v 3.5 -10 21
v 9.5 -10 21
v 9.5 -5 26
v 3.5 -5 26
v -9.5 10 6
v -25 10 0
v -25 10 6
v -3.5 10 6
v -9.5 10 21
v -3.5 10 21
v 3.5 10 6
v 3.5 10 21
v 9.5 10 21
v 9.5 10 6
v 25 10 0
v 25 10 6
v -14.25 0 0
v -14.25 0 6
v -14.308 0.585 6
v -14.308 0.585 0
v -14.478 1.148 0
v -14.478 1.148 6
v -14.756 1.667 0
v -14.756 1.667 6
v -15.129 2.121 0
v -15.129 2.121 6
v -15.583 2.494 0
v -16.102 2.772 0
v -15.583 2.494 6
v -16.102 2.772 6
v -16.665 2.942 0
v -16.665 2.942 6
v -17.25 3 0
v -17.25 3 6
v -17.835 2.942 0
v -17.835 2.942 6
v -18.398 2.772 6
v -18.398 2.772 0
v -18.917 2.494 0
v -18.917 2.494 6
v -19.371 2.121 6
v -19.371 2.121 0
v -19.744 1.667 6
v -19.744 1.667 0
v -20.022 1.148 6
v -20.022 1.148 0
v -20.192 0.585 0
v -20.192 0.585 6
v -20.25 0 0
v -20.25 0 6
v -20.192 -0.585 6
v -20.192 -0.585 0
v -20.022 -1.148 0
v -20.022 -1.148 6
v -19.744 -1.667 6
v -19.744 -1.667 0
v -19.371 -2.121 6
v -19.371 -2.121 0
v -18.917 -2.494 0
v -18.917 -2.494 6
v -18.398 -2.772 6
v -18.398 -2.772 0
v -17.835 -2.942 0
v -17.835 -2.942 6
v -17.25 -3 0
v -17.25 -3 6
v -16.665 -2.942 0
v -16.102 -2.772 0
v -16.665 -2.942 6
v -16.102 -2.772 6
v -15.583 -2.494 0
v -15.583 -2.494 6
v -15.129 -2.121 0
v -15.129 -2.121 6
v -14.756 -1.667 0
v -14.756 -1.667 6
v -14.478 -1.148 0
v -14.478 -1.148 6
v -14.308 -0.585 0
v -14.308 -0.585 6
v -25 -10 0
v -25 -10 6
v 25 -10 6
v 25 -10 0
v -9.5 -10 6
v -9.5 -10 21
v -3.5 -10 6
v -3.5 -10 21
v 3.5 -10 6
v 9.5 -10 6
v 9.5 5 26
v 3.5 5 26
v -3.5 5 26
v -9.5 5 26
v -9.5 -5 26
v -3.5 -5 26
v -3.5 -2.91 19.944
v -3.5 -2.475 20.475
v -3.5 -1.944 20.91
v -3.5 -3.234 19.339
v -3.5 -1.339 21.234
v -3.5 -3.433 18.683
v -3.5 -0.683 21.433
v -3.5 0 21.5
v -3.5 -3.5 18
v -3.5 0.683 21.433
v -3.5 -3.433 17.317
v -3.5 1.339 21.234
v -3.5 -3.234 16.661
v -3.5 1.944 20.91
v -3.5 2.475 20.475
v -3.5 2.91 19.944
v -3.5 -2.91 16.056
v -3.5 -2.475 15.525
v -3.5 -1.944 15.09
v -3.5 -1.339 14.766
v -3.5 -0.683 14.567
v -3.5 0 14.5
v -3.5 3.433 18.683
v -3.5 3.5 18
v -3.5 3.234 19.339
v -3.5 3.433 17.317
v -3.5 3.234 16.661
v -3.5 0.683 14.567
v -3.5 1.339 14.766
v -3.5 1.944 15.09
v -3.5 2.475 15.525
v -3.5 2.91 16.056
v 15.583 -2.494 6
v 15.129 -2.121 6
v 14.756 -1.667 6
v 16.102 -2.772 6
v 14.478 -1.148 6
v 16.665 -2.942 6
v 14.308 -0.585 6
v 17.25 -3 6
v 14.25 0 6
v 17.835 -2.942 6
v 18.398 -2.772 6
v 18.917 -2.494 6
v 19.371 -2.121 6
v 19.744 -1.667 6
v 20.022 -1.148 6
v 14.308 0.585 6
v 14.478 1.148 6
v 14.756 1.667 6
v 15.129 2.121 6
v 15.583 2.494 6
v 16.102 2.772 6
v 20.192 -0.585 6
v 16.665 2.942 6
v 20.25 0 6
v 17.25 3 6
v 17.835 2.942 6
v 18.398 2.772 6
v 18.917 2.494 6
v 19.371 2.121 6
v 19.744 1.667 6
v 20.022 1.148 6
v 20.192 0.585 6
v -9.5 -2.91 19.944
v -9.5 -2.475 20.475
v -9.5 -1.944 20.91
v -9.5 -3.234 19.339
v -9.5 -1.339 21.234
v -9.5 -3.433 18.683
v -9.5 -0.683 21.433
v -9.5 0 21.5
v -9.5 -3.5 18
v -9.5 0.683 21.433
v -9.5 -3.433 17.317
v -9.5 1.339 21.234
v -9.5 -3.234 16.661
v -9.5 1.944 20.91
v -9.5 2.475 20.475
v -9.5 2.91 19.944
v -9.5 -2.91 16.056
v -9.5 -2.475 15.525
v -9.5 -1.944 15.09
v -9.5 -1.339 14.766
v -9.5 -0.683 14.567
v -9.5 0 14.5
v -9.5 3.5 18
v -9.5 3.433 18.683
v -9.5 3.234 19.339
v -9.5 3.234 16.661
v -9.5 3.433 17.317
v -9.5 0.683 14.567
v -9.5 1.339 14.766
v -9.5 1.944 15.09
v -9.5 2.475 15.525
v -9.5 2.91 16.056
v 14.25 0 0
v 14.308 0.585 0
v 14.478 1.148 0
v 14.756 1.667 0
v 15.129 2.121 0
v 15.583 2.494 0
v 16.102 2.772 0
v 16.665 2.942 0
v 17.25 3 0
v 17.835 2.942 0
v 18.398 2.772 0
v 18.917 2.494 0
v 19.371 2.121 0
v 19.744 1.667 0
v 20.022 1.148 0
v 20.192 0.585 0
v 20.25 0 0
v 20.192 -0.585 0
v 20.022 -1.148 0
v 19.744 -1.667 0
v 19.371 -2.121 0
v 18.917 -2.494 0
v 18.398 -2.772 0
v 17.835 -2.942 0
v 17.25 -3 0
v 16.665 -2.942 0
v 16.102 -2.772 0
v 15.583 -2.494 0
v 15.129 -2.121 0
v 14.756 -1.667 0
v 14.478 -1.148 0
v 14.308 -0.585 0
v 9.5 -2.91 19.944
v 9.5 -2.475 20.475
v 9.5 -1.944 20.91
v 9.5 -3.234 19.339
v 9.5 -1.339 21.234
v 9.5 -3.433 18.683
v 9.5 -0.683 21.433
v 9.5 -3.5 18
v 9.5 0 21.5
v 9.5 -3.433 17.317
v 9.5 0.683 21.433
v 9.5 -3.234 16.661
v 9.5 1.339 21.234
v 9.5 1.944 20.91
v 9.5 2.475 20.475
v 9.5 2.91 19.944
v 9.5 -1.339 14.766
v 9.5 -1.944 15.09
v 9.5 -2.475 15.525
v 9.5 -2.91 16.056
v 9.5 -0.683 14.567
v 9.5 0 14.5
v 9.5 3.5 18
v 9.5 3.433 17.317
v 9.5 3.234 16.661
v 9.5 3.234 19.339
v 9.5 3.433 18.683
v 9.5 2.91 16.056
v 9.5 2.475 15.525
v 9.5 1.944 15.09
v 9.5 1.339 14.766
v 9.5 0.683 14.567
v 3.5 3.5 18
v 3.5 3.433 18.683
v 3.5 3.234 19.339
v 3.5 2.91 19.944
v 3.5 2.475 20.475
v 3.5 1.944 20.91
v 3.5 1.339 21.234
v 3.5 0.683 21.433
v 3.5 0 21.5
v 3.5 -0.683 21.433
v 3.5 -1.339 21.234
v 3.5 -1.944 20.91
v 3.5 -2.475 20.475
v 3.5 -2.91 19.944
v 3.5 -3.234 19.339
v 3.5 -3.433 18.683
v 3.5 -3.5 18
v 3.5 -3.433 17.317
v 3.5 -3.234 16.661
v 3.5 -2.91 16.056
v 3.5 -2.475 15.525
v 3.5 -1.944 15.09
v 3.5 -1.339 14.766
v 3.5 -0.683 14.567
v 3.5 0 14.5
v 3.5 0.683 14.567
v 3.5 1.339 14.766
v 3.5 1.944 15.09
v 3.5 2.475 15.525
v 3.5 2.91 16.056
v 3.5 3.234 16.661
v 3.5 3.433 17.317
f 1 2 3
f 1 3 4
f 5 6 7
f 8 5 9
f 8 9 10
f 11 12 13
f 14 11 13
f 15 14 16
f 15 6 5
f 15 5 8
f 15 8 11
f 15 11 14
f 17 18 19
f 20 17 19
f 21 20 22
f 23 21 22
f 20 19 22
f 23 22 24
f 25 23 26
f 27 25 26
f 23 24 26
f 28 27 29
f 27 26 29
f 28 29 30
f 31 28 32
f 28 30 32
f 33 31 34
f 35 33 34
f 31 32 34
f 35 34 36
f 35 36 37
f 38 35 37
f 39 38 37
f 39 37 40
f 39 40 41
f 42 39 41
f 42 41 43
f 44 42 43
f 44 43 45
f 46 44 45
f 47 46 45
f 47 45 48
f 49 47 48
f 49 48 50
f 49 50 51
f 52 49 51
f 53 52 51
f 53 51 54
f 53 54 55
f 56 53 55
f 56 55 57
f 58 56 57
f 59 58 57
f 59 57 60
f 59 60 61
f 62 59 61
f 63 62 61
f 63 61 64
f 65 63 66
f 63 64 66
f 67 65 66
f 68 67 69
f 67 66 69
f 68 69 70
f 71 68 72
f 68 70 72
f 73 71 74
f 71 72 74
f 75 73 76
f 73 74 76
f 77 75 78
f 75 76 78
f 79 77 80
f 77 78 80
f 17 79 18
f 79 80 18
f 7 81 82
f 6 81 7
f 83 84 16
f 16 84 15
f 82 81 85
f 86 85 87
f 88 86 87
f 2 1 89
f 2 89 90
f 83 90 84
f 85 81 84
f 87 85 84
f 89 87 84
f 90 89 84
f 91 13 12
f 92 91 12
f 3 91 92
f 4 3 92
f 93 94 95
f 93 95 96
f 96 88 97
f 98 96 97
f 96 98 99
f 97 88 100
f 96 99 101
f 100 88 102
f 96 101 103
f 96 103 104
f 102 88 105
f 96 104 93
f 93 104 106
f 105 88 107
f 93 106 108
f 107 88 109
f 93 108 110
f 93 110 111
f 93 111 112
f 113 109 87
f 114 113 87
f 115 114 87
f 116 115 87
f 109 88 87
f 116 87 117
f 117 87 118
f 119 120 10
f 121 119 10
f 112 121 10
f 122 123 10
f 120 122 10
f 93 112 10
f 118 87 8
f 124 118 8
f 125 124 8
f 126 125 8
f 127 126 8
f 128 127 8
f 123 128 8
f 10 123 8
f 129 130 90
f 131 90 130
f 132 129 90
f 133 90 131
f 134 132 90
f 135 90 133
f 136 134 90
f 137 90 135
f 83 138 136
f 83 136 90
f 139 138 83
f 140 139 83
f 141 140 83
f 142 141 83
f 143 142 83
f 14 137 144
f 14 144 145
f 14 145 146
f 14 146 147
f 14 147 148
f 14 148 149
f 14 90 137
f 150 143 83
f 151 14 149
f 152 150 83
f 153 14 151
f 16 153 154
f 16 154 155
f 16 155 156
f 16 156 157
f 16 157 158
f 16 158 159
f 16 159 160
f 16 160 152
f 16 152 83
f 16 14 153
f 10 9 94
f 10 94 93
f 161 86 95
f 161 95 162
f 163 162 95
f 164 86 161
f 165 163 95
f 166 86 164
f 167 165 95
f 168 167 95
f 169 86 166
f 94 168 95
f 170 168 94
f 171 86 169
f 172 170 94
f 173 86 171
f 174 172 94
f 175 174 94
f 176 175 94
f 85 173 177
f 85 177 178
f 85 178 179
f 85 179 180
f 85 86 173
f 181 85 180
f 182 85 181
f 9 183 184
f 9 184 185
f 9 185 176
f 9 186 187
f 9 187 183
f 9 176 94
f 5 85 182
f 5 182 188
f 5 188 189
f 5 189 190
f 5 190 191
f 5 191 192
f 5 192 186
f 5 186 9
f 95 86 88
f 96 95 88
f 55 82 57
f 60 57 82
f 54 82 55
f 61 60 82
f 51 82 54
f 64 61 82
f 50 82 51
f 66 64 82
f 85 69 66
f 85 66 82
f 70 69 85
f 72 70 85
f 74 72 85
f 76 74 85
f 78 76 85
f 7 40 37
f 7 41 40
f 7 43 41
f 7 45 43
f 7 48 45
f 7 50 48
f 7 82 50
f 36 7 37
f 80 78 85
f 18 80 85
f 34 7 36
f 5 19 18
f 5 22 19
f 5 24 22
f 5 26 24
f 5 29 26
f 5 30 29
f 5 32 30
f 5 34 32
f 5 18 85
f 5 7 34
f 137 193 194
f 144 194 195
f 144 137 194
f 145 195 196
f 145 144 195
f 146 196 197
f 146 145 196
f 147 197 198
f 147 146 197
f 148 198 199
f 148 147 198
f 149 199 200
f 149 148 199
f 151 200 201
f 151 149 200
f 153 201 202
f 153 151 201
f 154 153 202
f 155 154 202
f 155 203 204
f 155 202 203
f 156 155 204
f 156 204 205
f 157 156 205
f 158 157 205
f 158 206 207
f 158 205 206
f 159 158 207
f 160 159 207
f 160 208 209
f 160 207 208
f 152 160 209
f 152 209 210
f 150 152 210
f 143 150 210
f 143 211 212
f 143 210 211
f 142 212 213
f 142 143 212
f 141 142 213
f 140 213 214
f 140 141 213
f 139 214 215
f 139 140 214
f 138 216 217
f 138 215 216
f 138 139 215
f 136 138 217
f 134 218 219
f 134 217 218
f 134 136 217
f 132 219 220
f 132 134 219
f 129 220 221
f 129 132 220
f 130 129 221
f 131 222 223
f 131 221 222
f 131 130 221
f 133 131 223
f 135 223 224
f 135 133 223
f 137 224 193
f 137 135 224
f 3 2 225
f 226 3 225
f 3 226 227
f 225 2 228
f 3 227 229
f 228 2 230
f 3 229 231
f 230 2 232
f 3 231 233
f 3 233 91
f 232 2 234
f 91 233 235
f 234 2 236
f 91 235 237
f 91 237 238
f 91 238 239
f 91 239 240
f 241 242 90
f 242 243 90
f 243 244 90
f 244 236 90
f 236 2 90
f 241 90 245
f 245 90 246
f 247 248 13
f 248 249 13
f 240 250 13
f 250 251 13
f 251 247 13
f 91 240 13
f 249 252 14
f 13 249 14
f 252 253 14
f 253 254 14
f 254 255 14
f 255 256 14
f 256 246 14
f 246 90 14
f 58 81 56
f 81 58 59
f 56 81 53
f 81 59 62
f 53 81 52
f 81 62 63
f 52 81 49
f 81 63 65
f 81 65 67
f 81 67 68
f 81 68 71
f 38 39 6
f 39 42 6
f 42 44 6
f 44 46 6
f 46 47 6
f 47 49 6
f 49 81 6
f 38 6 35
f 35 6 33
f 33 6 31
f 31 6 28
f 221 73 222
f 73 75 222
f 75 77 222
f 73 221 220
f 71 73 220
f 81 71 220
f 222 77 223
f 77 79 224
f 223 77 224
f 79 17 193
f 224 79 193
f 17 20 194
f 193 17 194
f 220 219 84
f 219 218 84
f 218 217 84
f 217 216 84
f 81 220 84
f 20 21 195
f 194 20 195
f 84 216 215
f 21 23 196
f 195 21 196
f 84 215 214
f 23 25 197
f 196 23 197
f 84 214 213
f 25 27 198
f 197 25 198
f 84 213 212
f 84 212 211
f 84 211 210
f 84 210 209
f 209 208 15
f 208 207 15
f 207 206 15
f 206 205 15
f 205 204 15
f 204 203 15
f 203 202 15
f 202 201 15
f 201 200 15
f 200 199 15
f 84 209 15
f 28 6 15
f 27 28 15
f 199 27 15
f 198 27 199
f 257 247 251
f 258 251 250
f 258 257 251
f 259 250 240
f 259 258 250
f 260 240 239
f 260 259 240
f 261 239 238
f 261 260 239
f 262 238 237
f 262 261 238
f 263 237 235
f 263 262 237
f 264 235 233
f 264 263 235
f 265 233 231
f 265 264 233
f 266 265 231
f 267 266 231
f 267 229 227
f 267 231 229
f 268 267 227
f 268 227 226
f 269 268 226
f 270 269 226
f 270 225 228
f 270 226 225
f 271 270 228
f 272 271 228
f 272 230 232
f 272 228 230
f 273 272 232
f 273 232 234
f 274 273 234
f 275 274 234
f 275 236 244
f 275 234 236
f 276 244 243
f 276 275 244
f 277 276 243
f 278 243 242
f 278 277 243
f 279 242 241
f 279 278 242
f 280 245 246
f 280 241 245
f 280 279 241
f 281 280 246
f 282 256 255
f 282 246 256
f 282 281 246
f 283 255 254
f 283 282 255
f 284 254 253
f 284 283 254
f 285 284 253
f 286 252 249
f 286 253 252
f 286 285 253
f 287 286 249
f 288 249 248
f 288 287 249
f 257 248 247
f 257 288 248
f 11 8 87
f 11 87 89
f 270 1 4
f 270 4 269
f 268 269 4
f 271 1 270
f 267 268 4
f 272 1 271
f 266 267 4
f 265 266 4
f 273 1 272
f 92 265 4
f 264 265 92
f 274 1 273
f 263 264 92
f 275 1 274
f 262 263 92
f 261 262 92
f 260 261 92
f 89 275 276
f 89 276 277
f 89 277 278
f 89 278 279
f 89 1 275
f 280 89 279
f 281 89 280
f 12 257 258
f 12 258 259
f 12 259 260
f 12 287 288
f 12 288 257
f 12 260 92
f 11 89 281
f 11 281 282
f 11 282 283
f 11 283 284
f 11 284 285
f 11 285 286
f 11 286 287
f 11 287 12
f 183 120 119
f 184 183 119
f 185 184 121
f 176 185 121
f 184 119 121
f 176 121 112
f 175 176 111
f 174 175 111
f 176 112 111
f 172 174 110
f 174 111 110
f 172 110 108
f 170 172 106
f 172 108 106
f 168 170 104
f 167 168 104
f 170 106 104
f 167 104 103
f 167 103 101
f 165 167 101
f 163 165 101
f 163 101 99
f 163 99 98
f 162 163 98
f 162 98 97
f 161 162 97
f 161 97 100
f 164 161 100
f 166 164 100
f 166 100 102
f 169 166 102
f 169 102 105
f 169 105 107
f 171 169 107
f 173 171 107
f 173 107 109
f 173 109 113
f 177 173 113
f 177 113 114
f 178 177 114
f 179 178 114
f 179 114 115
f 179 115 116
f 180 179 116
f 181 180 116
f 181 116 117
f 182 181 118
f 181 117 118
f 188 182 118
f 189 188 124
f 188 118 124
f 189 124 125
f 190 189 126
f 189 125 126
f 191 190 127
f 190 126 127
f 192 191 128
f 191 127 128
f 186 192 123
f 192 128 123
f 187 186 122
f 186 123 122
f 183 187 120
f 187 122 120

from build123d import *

# Parameters (mm, degrees)
F0_W     = 50
F0_H     = 20
F1_DEPTH = 6
F2_W     = 6
F2_H     = 20
F3_DEPTH = 20
F4_R     = 3.5
F5_DEPTH = 25
F6_SIZE  = 5
F7_R     = 3
F8_DEPTH = 25


# Not quite as in the source:
# - a pattern or mirror of a feature is missing from the dataset's text; its kind, count and spacing are read off the source's solid


with BuildPart() as f1:
    # F0 (on Top) → F1 (new body)
    with BuildSketch(Plane.XY):
        Rectangle(F0_W, F0_H)
    extrude(amount=F1_DEPTH)

    # F2 (on face) → F3 (join)
    with BuildSketch(Plane.XY.offset(6)):
        with Locations((-6.5, 0)):
            Rectangle(F2_W, F2_H)
    f3 = extrude(amount=F3_DEPTH)

    # F3_copies: F3 across plane
    add(f3.mirror(Plane(origin=(0, 0, 0), x_dir=(0, 0, 1), z_dir=(1, 0, 0))))

    # F4 (on face) → F5 (cut)
    with BuildSketch(Plane.YZ.offset(-3.5)):
        with Locations((0, 18)):
            Circle(F4_R)
    f5 = extrude(amount=-F5_DEPTH, mode=Mode.SUBTRACT)

    # F5_copies: F5 across plane
    add(f5.mirror(Plane(origin=(0, 0, 0), x_dir=(0, 0, 1), z_dir=(1, 0, 0))), mode=Mode.SUBTRACT)

    # F6
    f6_edges = [f1.edges().sort_by_distance(p)[0] for p in [
        (-6.5, -10, 26),
        (-6.5, 10, 26),
        (6.5, -10, 26),
        (6.5, 10, 26),
    ]]
    chamfer(f6_edges, length=F6_SIZE)

    # F7 (on face) → F8 (cut)
    with BuildSketch(Plane.XY.offset(6)):
        with Locations((-17.25, 0)):
            Circle(F7_R)
    f8 = extrude(amount=-F8_DEPTH, mode=Mode.SUBTRACT)

    # F8_copies: F8 across plane
    add(f8.mirror(Plane(origin=(0, 0, 0), x_dir=(0, 0, 1), z_dir=(1, 0, 0))), mode=Mode.SUBTRACT)


solid = f1.part
